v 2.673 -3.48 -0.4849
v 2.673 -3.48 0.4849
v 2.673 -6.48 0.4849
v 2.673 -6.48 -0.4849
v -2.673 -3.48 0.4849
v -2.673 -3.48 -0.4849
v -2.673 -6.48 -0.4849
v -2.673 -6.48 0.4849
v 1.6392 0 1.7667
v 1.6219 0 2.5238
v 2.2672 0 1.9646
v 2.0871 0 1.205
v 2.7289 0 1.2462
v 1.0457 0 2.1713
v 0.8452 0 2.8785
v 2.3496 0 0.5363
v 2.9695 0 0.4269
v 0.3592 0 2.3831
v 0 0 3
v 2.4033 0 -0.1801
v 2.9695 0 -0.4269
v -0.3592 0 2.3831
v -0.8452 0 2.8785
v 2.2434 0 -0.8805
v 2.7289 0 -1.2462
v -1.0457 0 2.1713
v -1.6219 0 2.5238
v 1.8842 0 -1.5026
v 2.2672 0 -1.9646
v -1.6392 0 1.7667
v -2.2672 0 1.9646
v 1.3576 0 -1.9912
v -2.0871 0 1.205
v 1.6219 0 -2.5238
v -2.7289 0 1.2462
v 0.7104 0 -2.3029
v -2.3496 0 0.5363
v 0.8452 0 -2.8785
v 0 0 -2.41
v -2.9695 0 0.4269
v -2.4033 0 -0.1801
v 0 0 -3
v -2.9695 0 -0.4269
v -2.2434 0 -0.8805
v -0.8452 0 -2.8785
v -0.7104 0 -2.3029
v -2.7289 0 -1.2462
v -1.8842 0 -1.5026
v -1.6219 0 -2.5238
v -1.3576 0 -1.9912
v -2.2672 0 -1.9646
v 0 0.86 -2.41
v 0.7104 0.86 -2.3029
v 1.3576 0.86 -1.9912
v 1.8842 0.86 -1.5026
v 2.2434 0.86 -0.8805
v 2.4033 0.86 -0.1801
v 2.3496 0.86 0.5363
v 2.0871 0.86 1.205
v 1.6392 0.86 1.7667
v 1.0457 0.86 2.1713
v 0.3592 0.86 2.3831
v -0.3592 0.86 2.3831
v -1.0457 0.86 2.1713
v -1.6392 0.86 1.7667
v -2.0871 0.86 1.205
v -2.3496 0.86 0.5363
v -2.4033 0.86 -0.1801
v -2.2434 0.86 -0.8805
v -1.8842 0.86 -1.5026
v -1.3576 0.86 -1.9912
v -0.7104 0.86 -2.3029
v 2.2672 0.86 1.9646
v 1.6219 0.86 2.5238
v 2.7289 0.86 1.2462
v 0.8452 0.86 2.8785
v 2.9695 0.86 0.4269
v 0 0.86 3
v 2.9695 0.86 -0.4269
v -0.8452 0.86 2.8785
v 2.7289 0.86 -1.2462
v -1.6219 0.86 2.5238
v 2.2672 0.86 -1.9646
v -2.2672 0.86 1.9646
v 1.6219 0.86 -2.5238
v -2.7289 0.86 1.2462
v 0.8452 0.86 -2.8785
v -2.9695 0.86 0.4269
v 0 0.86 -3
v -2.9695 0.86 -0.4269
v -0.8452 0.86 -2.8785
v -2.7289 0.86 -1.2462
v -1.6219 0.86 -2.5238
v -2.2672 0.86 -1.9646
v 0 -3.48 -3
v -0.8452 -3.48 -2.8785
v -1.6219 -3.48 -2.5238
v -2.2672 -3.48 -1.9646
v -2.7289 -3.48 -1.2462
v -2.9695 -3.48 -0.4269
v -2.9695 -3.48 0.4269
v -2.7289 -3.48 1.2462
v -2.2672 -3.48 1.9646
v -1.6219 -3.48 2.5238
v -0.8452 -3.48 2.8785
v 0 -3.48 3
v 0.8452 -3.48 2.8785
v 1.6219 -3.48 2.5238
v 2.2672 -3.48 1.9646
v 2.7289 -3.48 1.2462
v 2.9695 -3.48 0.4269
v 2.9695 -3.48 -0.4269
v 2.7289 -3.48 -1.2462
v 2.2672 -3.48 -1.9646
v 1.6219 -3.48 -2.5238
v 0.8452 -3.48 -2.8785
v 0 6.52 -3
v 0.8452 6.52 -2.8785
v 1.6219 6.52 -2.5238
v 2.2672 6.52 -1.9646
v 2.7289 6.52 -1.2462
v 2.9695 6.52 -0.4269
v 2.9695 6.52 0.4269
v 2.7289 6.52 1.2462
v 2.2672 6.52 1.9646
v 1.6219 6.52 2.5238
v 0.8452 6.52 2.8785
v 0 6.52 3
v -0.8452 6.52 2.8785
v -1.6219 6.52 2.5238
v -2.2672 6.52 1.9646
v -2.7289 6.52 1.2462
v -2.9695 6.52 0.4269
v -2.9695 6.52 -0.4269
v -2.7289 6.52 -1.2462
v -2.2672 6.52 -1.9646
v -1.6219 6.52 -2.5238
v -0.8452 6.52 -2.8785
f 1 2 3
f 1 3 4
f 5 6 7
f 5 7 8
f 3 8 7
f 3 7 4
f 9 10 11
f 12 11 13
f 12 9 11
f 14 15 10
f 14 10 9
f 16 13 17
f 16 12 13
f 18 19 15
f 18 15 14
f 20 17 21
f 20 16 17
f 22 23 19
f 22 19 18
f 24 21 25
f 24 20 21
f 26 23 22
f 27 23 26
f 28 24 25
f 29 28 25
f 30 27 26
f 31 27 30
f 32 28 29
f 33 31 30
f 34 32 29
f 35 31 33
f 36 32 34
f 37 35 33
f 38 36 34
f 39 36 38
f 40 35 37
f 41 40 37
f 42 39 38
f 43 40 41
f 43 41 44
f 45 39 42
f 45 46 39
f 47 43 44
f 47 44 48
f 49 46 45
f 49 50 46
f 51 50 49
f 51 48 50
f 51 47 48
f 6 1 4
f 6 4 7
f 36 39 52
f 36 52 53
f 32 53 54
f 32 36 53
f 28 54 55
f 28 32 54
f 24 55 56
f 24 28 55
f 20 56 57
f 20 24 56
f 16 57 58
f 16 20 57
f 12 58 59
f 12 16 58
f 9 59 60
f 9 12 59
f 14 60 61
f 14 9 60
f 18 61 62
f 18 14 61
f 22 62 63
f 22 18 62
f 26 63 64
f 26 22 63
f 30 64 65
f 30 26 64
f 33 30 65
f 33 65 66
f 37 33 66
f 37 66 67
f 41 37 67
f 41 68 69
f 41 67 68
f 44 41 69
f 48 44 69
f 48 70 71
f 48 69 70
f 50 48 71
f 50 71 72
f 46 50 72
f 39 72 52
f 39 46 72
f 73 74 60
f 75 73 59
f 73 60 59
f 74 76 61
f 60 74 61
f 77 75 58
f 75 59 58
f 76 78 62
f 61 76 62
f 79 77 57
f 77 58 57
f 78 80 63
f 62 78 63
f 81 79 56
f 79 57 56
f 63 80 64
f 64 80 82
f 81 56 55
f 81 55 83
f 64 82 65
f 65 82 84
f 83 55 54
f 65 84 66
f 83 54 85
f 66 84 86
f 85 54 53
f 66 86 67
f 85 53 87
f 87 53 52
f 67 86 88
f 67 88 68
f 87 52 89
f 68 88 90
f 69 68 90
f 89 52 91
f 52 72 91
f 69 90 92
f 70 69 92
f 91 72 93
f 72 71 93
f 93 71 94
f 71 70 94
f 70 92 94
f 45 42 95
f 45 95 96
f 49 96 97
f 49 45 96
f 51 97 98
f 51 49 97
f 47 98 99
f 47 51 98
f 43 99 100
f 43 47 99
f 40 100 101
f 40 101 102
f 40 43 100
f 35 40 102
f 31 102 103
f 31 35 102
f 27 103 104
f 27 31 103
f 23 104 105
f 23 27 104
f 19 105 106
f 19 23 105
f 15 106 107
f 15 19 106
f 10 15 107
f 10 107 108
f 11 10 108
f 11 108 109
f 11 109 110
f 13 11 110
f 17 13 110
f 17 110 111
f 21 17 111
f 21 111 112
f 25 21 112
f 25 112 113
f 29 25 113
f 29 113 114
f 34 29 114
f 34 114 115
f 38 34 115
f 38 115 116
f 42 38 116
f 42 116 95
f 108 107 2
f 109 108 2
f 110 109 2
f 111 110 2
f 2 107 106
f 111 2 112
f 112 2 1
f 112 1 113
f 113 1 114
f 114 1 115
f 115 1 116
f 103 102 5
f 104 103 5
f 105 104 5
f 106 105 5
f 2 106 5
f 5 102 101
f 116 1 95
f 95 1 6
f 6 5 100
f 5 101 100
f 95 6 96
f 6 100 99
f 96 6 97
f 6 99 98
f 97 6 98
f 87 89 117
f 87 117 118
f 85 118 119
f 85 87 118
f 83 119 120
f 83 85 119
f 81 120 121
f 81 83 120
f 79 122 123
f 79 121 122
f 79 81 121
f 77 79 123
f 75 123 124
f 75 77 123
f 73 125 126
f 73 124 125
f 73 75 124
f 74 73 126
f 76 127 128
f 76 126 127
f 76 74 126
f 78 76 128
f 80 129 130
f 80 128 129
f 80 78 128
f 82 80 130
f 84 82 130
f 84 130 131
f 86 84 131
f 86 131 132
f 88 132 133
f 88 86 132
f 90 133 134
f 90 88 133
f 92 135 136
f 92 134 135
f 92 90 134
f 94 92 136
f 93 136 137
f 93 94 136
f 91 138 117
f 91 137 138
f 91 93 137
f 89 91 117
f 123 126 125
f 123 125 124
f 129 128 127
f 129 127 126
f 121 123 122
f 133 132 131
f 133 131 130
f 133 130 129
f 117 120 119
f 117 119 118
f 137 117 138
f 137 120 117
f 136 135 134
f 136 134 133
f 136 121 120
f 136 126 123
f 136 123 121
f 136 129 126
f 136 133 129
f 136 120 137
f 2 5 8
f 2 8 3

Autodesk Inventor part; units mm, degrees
ref_plane "YZ Plane" through (0, 0, 0) normal (1, 0, 0) x (0, 1, 0)
ref_plane "XZ Plane" through (0, 0, 0) normal (0, 1, 0) x (-1, 0, 0)
ref_plane "XY Plane" through (0, 0, 0) normal (0, 0, 1) x (1, 0, 0)
sketch "Sketch1" plane through (0, 0, 0) normal (1, 0, 0) x (0, 1, 0)
  line L0 (0, 0) -> (6.52, 0)
  line L1 (6.52, 0) -> (6.52, -3)
  line L2 (6.52, -3) -> (0.86, -3)
  line L3 (0.86, -3) -> (0.86, -2.41)
  line L4 (0.86, -2.41) -> (0, -2.41)
  line L5 (0, -2.41) -> (0, 0)
  line L6 (0, -6.589) -> (-0.9134, -6.589)
  line L7 (0, 0) -> (-3.48, 0)
  line L8 (-3.48, 0) -> (-3.48, -3)
  line L9 (-3.48, -3) -> (0, -3)
  line L10 (0, -3) -> (0, 0)
  point P0 (-0.9134, 0)
  dimension "d1" = 3
  dimension "d2" = 5.66
  dimension "d6" = 0.86
  dimension "d8" = 10
  dimension "d9" = 2.41
revolve "Revolution1" add sketch "Sketch1" angle 360 about axis through (0, 0, 0) along (0, 1, 0)
sketch "Sketch2" plane through (0, -3.48, 0) normal (0, -1, 0) x (1, 0, 0)
  circle A0 centre (0, 0) radius 3 projected
  line L0 (2.673, -0.4849) -> (-2.673, -0.4849)
  line L1 (-2.673, -0.4849) -> (-2.673, 0.4849)
  line L2 (-2.673, 0.4849) -> (2.673, 0.4849)
  line L3 (2.673, 0.4849) -> (2.673, -0.4849)
  line L4 (2.673, -0.4849) -> (-2.673, 0.4849) construction
  line L5 (-2.673, -0.4849) -> (2.673, 0.4849) construction
extrude "Extrusion1" add sketch "Sketch2" along normal blind 3 contours L0 L1 L2 L3
properties part number "00_IR_Laserdiode"
